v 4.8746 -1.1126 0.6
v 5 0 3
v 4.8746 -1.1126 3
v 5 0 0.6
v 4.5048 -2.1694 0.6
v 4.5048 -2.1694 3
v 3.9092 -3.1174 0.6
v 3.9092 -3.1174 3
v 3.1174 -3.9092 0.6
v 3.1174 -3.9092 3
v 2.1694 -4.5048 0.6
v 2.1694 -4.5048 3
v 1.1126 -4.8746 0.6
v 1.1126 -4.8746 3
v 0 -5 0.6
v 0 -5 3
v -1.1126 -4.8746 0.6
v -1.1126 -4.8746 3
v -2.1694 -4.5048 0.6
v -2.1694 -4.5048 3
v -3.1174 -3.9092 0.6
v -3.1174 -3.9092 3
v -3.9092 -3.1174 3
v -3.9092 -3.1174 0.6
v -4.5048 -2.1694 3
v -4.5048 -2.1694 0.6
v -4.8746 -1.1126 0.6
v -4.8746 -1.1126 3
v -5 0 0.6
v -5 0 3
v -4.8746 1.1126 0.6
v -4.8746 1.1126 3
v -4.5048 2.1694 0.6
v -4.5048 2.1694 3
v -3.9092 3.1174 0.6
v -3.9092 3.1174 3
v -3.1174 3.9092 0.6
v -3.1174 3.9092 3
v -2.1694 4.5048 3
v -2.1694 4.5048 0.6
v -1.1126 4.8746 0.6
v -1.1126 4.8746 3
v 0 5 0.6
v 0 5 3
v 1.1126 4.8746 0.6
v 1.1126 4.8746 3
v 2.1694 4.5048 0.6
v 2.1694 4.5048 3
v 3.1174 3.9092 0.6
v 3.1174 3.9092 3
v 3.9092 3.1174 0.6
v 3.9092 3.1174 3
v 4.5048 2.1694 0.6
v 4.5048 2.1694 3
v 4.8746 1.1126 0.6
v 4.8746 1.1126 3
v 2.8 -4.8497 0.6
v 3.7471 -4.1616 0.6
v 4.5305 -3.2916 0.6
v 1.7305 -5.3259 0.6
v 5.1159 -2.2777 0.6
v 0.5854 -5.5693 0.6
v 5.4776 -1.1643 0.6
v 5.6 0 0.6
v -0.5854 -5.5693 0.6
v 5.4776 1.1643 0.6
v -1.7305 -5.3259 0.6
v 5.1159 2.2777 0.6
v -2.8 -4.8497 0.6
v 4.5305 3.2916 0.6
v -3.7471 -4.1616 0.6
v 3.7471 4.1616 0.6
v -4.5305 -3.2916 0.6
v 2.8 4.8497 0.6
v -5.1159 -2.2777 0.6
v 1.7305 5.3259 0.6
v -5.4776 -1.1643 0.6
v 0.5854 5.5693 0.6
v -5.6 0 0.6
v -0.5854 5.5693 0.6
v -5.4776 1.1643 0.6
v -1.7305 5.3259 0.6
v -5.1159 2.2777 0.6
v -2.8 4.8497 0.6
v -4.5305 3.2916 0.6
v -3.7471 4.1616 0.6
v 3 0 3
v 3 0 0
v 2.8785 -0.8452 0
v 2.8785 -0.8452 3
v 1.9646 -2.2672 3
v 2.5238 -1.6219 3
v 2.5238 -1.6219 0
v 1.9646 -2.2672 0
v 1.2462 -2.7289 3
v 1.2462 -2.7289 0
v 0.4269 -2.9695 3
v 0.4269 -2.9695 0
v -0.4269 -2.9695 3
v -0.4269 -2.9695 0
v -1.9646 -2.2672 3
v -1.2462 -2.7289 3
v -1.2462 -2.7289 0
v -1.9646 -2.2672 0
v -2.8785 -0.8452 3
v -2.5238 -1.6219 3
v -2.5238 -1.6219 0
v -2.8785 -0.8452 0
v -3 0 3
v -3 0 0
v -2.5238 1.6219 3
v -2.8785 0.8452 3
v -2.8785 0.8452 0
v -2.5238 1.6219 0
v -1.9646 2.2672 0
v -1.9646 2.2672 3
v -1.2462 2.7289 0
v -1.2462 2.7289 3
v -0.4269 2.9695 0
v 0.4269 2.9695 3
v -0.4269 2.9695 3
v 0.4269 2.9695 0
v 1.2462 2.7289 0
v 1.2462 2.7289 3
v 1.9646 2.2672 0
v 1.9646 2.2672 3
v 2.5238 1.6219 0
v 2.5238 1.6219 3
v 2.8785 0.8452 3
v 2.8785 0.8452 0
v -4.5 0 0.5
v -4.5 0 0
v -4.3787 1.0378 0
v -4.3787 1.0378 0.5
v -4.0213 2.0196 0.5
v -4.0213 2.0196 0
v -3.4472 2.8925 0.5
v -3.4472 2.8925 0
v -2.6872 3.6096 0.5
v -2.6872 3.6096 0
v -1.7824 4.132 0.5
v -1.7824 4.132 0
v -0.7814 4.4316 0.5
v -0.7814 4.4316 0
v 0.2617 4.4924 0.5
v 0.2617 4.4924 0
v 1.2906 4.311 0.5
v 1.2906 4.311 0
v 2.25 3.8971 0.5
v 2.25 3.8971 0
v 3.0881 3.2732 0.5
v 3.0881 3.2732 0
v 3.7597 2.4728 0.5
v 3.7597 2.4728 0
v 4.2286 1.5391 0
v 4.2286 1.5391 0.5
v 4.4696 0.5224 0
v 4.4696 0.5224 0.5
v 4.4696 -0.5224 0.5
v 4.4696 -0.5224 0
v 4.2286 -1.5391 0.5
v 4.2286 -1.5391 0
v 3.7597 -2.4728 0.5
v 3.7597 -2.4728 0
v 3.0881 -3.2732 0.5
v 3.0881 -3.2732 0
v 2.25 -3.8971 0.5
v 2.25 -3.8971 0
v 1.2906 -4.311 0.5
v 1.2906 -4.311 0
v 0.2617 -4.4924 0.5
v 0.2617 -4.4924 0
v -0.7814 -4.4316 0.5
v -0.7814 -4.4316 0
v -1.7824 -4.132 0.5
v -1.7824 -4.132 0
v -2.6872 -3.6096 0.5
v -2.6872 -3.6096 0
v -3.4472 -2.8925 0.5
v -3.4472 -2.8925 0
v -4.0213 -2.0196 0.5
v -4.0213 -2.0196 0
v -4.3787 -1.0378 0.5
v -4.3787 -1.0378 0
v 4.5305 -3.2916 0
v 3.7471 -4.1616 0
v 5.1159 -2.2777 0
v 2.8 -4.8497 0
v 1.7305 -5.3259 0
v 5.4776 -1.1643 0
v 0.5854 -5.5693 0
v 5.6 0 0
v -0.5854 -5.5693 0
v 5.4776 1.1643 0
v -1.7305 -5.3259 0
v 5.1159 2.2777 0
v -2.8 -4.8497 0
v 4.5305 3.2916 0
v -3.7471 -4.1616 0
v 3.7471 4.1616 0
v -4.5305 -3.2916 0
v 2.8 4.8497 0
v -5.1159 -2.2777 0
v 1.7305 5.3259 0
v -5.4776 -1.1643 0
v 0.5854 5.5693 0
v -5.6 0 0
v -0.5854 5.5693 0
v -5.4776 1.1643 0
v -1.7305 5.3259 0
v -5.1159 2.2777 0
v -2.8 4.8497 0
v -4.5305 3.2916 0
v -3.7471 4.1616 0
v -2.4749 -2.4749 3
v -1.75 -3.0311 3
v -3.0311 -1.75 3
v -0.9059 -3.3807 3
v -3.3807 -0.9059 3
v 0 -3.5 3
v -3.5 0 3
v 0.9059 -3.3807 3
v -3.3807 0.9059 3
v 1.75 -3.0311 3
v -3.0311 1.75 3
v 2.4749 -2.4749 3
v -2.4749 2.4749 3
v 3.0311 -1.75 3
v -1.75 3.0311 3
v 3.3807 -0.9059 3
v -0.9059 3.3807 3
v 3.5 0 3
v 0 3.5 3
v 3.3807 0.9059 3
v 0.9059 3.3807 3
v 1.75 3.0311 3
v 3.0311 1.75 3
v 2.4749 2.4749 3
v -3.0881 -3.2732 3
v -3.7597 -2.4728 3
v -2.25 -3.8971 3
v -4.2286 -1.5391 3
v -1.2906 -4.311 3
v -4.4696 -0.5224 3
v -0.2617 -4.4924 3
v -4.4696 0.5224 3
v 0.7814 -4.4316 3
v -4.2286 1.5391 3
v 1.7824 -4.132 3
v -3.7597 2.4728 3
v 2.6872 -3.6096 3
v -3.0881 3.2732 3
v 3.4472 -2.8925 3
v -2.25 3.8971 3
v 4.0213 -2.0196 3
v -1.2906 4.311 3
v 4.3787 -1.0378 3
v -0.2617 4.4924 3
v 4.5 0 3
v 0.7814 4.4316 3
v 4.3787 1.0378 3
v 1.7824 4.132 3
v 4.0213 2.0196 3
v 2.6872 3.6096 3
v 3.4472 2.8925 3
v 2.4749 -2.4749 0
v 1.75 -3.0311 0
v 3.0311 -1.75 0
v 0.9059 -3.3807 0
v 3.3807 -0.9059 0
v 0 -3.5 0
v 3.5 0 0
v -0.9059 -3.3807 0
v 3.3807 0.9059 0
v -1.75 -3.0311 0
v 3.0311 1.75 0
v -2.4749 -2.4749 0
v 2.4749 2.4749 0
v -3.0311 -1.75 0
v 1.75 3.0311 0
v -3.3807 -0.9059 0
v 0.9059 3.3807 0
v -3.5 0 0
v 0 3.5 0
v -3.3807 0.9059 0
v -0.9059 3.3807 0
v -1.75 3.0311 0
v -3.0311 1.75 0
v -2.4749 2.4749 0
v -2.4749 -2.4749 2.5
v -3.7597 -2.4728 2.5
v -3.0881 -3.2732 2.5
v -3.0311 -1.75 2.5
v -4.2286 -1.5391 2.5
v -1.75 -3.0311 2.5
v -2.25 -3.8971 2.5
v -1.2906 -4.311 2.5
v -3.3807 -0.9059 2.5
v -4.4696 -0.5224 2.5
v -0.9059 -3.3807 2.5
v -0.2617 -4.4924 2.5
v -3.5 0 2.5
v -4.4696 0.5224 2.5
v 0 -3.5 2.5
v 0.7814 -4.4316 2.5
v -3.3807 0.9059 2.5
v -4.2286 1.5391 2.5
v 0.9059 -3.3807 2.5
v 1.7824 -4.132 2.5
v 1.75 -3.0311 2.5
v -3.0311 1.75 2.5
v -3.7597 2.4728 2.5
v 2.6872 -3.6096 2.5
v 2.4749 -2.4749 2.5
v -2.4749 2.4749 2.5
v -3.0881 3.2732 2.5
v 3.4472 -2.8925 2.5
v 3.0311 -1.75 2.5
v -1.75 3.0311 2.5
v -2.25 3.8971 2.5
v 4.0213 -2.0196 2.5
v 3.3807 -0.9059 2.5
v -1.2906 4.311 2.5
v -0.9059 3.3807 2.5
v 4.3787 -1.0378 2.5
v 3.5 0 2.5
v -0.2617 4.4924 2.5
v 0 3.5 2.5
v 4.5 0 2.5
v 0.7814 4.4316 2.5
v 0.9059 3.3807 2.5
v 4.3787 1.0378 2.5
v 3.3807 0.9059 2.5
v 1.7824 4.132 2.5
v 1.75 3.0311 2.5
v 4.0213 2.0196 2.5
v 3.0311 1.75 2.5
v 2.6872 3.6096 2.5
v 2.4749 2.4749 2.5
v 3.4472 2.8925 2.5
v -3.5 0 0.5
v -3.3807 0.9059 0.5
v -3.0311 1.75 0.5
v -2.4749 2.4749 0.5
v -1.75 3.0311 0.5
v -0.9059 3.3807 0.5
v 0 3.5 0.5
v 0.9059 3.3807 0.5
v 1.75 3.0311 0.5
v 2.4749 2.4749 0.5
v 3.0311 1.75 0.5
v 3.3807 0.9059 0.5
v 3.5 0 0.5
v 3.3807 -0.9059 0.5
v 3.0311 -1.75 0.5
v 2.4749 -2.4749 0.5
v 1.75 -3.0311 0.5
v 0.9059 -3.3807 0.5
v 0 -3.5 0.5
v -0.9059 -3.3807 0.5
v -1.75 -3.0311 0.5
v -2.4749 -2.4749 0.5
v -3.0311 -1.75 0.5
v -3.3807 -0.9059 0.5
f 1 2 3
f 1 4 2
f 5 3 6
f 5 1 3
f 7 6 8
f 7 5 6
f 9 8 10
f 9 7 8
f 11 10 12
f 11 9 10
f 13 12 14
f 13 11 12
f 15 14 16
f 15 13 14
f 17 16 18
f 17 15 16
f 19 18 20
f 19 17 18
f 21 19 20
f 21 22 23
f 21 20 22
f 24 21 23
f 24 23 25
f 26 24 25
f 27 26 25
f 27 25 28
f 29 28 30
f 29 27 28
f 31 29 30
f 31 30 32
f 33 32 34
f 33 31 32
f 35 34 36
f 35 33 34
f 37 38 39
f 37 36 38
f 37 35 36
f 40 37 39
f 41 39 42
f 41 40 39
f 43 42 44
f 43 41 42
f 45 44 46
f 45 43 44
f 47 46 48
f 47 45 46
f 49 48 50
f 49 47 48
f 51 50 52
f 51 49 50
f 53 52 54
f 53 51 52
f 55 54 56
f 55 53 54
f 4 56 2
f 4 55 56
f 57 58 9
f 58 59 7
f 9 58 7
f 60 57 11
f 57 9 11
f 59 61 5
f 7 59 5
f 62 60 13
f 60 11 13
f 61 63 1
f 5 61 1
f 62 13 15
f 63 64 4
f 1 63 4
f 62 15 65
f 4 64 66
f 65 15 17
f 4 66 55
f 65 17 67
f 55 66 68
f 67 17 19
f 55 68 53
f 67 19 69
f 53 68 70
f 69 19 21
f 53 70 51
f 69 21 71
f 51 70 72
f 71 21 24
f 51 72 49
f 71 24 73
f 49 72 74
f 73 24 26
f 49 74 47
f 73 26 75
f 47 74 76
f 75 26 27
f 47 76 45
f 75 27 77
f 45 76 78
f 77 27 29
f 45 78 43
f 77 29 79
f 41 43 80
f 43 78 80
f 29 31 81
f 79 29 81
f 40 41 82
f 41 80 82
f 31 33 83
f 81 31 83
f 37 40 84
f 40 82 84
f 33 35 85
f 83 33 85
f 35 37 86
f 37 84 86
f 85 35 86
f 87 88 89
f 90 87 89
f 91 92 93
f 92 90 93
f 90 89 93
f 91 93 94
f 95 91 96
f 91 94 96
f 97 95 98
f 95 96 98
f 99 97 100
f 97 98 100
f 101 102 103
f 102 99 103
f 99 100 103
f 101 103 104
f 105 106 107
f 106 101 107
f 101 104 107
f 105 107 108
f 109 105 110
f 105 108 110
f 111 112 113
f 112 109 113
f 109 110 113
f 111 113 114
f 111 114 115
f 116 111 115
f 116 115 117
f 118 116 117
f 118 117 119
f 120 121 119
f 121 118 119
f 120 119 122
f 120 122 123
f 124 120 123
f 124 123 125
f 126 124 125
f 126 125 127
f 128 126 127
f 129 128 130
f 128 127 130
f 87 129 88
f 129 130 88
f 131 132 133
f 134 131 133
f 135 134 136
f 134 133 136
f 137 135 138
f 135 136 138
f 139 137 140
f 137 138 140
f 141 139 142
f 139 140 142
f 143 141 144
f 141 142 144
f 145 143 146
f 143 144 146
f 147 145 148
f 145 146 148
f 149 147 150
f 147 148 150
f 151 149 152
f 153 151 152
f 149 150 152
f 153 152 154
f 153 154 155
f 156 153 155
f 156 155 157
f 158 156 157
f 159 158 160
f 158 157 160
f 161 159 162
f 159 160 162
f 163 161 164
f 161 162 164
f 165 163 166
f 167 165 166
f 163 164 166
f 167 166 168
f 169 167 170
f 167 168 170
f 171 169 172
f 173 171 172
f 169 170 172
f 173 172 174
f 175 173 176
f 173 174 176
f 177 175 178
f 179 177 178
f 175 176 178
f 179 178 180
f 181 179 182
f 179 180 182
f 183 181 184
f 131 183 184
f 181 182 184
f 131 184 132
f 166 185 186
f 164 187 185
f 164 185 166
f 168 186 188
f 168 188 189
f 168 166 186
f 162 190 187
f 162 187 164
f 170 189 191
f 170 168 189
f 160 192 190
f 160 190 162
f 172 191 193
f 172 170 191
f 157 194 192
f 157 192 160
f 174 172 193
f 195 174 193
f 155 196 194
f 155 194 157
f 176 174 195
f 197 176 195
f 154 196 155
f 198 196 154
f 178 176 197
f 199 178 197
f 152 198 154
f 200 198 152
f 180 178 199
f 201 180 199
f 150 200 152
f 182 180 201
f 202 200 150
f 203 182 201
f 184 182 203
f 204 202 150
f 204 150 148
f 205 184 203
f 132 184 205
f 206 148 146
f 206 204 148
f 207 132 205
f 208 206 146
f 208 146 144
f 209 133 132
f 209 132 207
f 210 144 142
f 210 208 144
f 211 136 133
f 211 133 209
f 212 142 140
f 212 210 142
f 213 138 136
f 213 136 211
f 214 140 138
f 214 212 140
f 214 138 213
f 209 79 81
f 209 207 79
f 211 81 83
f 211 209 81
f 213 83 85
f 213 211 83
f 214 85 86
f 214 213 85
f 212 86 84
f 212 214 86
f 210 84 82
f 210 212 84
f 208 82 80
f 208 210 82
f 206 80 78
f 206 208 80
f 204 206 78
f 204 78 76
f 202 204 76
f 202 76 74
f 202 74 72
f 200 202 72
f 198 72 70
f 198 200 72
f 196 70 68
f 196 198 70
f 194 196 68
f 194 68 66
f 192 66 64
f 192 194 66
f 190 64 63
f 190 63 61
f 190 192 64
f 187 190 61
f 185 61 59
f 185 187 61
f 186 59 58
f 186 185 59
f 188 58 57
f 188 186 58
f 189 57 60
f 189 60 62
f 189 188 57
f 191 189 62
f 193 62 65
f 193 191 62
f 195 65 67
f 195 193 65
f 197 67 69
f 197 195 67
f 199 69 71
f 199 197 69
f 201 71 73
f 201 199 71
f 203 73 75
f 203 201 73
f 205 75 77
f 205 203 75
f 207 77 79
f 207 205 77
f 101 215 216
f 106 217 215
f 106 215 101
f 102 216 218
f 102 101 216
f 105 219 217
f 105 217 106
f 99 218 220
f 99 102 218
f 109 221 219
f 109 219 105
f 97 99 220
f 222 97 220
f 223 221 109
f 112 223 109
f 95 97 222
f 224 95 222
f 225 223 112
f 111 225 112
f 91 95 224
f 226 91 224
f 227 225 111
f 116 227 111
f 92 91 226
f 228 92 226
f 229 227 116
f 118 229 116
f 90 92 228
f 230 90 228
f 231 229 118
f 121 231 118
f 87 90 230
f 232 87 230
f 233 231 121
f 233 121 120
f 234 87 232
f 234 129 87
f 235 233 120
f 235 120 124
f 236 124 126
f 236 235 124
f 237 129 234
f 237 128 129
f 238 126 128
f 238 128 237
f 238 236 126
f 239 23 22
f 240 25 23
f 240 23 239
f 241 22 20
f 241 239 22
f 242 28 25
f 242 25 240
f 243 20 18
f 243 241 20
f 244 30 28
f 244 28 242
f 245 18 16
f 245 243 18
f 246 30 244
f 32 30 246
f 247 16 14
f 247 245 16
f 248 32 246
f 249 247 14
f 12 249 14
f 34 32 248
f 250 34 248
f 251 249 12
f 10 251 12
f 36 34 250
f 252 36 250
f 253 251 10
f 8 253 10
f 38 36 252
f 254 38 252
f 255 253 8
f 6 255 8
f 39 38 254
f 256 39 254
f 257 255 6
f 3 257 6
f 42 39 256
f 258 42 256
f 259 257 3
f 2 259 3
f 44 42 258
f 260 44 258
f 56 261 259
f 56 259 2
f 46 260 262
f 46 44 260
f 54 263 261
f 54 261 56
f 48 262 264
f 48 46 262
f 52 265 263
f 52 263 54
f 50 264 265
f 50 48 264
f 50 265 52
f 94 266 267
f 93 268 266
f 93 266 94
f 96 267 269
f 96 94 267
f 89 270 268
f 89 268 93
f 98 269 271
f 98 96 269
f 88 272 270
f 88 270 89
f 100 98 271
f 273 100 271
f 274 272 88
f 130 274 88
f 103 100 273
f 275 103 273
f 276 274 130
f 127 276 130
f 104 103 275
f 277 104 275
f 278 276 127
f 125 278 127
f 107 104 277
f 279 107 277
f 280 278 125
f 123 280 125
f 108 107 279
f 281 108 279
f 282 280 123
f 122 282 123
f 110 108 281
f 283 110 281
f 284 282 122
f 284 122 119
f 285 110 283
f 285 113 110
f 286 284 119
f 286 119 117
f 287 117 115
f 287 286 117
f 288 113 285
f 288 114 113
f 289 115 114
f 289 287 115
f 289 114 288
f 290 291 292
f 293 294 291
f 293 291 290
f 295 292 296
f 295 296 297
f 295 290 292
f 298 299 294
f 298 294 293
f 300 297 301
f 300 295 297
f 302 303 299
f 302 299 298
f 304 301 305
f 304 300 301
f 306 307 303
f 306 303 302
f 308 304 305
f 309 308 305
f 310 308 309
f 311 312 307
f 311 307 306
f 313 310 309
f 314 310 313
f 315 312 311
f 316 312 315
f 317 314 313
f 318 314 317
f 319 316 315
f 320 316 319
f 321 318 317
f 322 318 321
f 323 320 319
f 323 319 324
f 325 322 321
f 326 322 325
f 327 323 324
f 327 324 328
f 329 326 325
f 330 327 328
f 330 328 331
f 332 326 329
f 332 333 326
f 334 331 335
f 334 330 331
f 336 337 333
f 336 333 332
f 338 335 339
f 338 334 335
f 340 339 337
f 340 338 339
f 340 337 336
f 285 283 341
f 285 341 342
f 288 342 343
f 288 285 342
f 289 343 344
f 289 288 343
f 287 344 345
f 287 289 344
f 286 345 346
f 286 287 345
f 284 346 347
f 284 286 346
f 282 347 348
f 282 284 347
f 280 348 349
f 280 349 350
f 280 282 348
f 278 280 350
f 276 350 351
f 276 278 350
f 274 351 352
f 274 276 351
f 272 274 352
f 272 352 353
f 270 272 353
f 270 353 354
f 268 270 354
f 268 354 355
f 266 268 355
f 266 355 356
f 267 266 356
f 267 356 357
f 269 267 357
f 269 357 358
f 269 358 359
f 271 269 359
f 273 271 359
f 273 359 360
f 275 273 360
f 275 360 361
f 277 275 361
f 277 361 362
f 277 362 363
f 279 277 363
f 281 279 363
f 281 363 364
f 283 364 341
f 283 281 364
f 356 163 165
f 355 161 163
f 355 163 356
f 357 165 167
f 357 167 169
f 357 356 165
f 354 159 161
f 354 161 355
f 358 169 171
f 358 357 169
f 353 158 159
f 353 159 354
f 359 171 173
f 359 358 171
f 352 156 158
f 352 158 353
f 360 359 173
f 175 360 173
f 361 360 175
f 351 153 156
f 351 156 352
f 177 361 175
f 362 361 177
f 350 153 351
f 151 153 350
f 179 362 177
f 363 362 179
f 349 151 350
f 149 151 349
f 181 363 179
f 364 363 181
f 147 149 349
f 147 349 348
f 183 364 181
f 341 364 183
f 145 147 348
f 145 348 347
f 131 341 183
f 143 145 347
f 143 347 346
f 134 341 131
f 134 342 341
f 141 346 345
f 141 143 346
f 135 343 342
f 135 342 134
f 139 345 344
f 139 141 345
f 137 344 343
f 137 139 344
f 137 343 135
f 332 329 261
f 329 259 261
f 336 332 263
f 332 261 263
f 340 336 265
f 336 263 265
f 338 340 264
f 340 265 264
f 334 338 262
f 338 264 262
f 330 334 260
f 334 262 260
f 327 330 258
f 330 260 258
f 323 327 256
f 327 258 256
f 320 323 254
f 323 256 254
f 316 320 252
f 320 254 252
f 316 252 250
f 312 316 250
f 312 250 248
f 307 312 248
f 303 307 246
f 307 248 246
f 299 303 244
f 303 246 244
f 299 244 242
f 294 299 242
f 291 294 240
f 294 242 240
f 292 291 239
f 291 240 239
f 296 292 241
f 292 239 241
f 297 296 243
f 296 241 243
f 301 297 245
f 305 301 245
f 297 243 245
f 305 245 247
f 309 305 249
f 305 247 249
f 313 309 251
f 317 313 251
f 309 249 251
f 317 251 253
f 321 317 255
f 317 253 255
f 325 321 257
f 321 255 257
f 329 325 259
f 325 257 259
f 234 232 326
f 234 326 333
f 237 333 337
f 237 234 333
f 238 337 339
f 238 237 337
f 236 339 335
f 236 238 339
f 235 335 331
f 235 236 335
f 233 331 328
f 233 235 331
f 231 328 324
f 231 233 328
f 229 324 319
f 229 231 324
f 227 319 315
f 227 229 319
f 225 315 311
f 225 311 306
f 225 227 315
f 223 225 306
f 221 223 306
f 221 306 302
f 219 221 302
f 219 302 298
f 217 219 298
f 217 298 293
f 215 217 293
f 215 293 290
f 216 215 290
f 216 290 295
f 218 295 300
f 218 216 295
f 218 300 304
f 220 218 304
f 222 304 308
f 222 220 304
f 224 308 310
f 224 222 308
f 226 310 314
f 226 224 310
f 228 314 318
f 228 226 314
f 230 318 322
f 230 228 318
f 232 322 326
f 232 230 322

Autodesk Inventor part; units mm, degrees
ref_plane "YZ Plane" through (0, 0, 0) normal (1, 0, 0) x (0, 1, 0)
ref_plane "XZ Plane" through (0, 0, 0) normal (0, 1, 0) x (-1, 0, 0)
ref_plane "XY Plane" through (0, 0, 0) normal (0, 0, 1) x (1, 0, 0)
sketch "スケッチ1" plane through (0, 0, 0) normal (0, 0, 1) x (1, 0, 0)
  circle A0 centre (0, 0) radius 3
  circle A1 centre (0, 0) radius 5
  dimension "d0" = 6
  dimension "d1" = 10
extrude "押し出し1" add sketch "スケッチ1" along normal blind 3
sketch "スケッチ2" plane through (0, 0, 0) normal (0, 0, -1) x (-1, 0, 0)
  circle A0 centre (0, 0) radius 3 projected
  circle A1 centre (0, 0) radius 5 projected
  circle A2 centre (0, 0) radius 5.6
  dimension "d4" = 11.2
extrude "押し出し2" add sketch "スケッチ2" against normal blind 0.6 contours A2
sketch "スケッチ3" plane through (0, 0, 3) normal (0, 0, 1) x (1, 0, 0)
  circle A0 centre (0, 0) radius 3 projected
  circle A1 centre (0, 0) radius 5 projected
  circle A2 centre (0, 0) radius 4.5
  circle A3 centre (0, 0) radius 3.5
  dimension "d7" = 0.5
  dimension "d8" = 0.5
extrude "押し出し3" cut sketch "スケッチ3" against normal blind 0.5 contours A2
sketch "スケッチ4" plane through (0, 0, 0) normal (0, 0, -1) x (-1, 0, 0)
  circle A0 centre (0, 0) radius 3.5 projected
  circle A1 centre (0, 0) radius 4.5 projected
extrude "押し出し4" cut sketch "スケッチ4" against normal blind 0.5
sketch "スケッチ5" plane through (0, 0, 0) normal (0, 0, -1) x (-1, 0, 0)
  point P0 (0, 0)
properties part number "ベアリングHd6-D10-B3" material "鋼、炭素鋼"
